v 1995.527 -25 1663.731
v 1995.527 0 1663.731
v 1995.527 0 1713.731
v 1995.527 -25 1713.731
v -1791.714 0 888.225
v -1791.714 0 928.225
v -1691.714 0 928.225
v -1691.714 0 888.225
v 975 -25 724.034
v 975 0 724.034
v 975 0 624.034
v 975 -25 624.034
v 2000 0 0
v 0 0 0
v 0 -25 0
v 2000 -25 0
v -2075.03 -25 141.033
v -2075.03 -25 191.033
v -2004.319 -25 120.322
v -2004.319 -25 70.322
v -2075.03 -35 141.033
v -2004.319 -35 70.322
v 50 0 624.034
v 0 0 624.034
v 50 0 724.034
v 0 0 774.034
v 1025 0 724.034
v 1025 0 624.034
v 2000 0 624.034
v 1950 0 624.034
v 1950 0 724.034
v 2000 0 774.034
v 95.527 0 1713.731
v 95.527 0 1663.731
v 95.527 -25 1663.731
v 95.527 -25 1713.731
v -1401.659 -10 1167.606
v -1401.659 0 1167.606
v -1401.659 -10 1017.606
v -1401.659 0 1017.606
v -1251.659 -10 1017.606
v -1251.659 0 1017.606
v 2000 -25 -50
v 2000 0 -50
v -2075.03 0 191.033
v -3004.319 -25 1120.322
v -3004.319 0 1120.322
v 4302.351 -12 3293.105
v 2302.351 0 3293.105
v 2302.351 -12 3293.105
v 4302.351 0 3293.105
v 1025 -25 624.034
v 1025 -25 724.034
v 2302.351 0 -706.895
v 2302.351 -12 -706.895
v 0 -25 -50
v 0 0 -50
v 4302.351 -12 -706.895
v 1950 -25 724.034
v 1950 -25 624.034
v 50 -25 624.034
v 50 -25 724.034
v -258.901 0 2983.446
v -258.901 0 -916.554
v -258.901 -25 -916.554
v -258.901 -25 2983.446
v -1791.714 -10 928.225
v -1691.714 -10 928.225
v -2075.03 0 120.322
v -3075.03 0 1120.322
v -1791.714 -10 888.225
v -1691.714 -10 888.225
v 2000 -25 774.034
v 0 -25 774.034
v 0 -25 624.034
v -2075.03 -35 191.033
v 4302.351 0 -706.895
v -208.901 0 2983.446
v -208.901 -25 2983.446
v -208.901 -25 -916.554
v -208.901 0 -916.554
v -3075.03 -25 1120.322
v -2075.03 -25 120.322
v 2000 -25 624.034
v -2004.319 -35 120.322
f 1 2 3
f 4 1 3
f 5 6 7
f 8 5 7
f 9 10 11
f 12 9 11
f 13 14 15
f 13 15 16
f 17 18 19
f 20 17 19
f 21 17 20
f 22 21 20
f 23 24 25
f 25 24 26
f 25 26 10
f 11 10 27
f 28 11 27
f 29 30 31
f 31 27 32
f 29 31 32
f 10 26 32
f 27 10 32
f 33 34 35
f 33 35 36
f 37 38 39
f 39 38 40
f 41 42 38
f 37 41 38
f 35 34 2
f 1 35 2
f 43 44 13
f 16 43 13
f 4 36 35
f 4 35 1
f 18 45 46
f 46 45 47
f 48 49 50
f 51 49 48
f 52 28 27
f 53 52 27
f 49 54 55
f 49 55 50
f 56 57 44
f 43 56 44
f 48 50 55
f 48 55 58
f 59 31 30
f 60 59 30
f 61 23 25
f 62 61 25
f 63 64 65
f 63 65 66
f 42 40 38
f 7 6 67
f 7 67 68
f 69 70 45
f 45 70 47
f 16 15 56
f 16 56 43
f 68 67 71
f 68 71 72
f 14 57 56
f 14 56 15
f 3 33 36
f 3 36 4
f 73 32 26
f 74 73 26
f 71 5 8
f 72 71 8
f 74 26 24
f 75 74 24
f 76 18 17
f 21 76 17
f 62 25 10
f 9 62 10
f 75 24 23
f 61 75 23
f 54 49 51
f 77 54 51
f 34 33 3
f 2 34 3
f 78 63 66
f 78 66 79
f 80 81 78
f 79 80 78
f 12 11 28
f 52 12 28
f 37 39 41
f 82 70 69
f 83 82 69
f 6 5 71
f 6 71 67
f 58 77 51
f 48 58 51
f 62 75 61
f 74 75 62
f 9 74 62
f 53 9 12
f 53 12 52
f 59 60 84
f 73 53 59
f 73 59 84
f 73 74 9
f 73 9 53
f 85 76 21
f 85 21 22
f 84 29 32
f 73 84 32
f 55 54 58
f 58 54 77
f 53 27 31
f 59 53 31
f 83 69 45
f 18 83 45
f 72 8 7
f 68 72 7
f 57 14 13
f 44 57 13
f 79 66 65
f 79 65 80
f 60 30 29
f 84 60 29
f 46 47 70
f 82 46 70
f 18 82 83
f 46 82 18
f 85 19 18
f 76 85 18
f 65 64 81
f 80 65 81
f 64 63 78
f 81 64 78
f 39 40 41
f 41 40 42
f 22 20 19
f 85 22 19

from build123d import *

# Parameters (mm, degrees)
F0_W      = 2000
F0_H      = 50
F1_DEPTH  = 25
F2_W      = 50
F2_H      = 3900
F3_DEPTH  = 25
F5_DEPTH  = 25
F6_W      = 1900
F6_H      = 50
F7_DEPTH  = 25
F9_DEPTH  = 25
F11_DEPTH = 10
F12_W     = 100
F12_H     = 40
F13_DEPTH = 10
F15_DEPTH = 10
F16_W     = 2000
F16_H     = 4000
F17_DEPTH = 12


with BuildPart() as f1:
    # F0 (on Front) → F1 (new body)
    with BuildSketch(Plane.XZ):
        with Locations((1000, -25)):
            Rectangle(F0_W, F0_H)
    extrude(amount=F1_DEPTH)


with BuildPart() as f3:
    # F2 (on Front) → F3 (new body)
    with BuildSketch(Plane.XZ):
        with Locations((-233.900586, 1033.445787)):
            Rectangle(F2_W, F2_H)
    extrude(amount=F3_DEPTH)


with BuildPart() as f5:
    # F4 (on Front) → F5 (new body)
    with BuildSketch(Plane.XZ):
        Polygon((2000, 774.034464), (0, 774.034464), (0, 624.034464), (50, 624.034464), (50, 724.034464), (975, 724.034464), (975, 624.034464), (1025, 624.034464), (1025, 724.034464), (1950, 724.034464), (1950, 624.034464), (2000, 624.034464), align=None)
    extrude(amount=F5_DEPTH)


with BuildPart() as f7:
    # F6 (on Front) → F7 (new body)
    with BuildSketch(Plane.XZ):
        with Locations((1045.526671, 1688.731456)):
            Rectangle(F6_W, F6_H)
    extrude(amount=F7_DEPTH)


with BuildPart() as f9:
    # F8 (on Front) → F9 (new body)
    with BuildSketch(Plane.XZ):
        Polygon((-3004.318933, 1120.322466), (-3075.029612, 1120.322466), (-2075.029612, 120.322466), (-2075.029612, 191.033144), align=None)
    extrude(amount=F9_DEPTH)


with BuildPart() as f11:
    # F10 (on face) → F11 (new body)
    with BuildSketch(Plane.XZ.offset(25)):
        Polygon((-2004.318933, 120.322466), (-2075.029612, 191.033144), (-2075.029612, 141.033144), (-2004.318933, 70.322466), align=None)
    extrude(amount=F11_DEPTH)


with BuildPart() as f13:
    # F12 (on Front) → F13 (new body)
    with BuildSketch(Plane.XZ):
        with Locations((-1741.714168, 908.225138)):
            Rectangle(F12_W, F12_H)
    extrude(amount=F13_DEPTH)


with BuildPart() as f15:
    # F14 (on Front) → F15 (new body)
    with BuildSketch(Plane.XZ):
        Polygon((-1251.659489, 1017.606497), (-1401.659489, 1167.606497), (-1401.659489, 1017.606497), align=None)
    extrude(amount=F15_DEPTH)


with BuildPart() as f17:
    # F16 (on Front) → F17 (new body)
    with BuildSketch(Plane.XZ):
        with Locations((3302.350998, 1293.105304)):
            Rectangle(F16_W, F16_H)
    extrude(amount=F17_DEPTH)


solid = Compound([f1.part, f3.part, f5.part, f7.part, f9.part, f11.part, f13.part, f15.part, f17.part])
